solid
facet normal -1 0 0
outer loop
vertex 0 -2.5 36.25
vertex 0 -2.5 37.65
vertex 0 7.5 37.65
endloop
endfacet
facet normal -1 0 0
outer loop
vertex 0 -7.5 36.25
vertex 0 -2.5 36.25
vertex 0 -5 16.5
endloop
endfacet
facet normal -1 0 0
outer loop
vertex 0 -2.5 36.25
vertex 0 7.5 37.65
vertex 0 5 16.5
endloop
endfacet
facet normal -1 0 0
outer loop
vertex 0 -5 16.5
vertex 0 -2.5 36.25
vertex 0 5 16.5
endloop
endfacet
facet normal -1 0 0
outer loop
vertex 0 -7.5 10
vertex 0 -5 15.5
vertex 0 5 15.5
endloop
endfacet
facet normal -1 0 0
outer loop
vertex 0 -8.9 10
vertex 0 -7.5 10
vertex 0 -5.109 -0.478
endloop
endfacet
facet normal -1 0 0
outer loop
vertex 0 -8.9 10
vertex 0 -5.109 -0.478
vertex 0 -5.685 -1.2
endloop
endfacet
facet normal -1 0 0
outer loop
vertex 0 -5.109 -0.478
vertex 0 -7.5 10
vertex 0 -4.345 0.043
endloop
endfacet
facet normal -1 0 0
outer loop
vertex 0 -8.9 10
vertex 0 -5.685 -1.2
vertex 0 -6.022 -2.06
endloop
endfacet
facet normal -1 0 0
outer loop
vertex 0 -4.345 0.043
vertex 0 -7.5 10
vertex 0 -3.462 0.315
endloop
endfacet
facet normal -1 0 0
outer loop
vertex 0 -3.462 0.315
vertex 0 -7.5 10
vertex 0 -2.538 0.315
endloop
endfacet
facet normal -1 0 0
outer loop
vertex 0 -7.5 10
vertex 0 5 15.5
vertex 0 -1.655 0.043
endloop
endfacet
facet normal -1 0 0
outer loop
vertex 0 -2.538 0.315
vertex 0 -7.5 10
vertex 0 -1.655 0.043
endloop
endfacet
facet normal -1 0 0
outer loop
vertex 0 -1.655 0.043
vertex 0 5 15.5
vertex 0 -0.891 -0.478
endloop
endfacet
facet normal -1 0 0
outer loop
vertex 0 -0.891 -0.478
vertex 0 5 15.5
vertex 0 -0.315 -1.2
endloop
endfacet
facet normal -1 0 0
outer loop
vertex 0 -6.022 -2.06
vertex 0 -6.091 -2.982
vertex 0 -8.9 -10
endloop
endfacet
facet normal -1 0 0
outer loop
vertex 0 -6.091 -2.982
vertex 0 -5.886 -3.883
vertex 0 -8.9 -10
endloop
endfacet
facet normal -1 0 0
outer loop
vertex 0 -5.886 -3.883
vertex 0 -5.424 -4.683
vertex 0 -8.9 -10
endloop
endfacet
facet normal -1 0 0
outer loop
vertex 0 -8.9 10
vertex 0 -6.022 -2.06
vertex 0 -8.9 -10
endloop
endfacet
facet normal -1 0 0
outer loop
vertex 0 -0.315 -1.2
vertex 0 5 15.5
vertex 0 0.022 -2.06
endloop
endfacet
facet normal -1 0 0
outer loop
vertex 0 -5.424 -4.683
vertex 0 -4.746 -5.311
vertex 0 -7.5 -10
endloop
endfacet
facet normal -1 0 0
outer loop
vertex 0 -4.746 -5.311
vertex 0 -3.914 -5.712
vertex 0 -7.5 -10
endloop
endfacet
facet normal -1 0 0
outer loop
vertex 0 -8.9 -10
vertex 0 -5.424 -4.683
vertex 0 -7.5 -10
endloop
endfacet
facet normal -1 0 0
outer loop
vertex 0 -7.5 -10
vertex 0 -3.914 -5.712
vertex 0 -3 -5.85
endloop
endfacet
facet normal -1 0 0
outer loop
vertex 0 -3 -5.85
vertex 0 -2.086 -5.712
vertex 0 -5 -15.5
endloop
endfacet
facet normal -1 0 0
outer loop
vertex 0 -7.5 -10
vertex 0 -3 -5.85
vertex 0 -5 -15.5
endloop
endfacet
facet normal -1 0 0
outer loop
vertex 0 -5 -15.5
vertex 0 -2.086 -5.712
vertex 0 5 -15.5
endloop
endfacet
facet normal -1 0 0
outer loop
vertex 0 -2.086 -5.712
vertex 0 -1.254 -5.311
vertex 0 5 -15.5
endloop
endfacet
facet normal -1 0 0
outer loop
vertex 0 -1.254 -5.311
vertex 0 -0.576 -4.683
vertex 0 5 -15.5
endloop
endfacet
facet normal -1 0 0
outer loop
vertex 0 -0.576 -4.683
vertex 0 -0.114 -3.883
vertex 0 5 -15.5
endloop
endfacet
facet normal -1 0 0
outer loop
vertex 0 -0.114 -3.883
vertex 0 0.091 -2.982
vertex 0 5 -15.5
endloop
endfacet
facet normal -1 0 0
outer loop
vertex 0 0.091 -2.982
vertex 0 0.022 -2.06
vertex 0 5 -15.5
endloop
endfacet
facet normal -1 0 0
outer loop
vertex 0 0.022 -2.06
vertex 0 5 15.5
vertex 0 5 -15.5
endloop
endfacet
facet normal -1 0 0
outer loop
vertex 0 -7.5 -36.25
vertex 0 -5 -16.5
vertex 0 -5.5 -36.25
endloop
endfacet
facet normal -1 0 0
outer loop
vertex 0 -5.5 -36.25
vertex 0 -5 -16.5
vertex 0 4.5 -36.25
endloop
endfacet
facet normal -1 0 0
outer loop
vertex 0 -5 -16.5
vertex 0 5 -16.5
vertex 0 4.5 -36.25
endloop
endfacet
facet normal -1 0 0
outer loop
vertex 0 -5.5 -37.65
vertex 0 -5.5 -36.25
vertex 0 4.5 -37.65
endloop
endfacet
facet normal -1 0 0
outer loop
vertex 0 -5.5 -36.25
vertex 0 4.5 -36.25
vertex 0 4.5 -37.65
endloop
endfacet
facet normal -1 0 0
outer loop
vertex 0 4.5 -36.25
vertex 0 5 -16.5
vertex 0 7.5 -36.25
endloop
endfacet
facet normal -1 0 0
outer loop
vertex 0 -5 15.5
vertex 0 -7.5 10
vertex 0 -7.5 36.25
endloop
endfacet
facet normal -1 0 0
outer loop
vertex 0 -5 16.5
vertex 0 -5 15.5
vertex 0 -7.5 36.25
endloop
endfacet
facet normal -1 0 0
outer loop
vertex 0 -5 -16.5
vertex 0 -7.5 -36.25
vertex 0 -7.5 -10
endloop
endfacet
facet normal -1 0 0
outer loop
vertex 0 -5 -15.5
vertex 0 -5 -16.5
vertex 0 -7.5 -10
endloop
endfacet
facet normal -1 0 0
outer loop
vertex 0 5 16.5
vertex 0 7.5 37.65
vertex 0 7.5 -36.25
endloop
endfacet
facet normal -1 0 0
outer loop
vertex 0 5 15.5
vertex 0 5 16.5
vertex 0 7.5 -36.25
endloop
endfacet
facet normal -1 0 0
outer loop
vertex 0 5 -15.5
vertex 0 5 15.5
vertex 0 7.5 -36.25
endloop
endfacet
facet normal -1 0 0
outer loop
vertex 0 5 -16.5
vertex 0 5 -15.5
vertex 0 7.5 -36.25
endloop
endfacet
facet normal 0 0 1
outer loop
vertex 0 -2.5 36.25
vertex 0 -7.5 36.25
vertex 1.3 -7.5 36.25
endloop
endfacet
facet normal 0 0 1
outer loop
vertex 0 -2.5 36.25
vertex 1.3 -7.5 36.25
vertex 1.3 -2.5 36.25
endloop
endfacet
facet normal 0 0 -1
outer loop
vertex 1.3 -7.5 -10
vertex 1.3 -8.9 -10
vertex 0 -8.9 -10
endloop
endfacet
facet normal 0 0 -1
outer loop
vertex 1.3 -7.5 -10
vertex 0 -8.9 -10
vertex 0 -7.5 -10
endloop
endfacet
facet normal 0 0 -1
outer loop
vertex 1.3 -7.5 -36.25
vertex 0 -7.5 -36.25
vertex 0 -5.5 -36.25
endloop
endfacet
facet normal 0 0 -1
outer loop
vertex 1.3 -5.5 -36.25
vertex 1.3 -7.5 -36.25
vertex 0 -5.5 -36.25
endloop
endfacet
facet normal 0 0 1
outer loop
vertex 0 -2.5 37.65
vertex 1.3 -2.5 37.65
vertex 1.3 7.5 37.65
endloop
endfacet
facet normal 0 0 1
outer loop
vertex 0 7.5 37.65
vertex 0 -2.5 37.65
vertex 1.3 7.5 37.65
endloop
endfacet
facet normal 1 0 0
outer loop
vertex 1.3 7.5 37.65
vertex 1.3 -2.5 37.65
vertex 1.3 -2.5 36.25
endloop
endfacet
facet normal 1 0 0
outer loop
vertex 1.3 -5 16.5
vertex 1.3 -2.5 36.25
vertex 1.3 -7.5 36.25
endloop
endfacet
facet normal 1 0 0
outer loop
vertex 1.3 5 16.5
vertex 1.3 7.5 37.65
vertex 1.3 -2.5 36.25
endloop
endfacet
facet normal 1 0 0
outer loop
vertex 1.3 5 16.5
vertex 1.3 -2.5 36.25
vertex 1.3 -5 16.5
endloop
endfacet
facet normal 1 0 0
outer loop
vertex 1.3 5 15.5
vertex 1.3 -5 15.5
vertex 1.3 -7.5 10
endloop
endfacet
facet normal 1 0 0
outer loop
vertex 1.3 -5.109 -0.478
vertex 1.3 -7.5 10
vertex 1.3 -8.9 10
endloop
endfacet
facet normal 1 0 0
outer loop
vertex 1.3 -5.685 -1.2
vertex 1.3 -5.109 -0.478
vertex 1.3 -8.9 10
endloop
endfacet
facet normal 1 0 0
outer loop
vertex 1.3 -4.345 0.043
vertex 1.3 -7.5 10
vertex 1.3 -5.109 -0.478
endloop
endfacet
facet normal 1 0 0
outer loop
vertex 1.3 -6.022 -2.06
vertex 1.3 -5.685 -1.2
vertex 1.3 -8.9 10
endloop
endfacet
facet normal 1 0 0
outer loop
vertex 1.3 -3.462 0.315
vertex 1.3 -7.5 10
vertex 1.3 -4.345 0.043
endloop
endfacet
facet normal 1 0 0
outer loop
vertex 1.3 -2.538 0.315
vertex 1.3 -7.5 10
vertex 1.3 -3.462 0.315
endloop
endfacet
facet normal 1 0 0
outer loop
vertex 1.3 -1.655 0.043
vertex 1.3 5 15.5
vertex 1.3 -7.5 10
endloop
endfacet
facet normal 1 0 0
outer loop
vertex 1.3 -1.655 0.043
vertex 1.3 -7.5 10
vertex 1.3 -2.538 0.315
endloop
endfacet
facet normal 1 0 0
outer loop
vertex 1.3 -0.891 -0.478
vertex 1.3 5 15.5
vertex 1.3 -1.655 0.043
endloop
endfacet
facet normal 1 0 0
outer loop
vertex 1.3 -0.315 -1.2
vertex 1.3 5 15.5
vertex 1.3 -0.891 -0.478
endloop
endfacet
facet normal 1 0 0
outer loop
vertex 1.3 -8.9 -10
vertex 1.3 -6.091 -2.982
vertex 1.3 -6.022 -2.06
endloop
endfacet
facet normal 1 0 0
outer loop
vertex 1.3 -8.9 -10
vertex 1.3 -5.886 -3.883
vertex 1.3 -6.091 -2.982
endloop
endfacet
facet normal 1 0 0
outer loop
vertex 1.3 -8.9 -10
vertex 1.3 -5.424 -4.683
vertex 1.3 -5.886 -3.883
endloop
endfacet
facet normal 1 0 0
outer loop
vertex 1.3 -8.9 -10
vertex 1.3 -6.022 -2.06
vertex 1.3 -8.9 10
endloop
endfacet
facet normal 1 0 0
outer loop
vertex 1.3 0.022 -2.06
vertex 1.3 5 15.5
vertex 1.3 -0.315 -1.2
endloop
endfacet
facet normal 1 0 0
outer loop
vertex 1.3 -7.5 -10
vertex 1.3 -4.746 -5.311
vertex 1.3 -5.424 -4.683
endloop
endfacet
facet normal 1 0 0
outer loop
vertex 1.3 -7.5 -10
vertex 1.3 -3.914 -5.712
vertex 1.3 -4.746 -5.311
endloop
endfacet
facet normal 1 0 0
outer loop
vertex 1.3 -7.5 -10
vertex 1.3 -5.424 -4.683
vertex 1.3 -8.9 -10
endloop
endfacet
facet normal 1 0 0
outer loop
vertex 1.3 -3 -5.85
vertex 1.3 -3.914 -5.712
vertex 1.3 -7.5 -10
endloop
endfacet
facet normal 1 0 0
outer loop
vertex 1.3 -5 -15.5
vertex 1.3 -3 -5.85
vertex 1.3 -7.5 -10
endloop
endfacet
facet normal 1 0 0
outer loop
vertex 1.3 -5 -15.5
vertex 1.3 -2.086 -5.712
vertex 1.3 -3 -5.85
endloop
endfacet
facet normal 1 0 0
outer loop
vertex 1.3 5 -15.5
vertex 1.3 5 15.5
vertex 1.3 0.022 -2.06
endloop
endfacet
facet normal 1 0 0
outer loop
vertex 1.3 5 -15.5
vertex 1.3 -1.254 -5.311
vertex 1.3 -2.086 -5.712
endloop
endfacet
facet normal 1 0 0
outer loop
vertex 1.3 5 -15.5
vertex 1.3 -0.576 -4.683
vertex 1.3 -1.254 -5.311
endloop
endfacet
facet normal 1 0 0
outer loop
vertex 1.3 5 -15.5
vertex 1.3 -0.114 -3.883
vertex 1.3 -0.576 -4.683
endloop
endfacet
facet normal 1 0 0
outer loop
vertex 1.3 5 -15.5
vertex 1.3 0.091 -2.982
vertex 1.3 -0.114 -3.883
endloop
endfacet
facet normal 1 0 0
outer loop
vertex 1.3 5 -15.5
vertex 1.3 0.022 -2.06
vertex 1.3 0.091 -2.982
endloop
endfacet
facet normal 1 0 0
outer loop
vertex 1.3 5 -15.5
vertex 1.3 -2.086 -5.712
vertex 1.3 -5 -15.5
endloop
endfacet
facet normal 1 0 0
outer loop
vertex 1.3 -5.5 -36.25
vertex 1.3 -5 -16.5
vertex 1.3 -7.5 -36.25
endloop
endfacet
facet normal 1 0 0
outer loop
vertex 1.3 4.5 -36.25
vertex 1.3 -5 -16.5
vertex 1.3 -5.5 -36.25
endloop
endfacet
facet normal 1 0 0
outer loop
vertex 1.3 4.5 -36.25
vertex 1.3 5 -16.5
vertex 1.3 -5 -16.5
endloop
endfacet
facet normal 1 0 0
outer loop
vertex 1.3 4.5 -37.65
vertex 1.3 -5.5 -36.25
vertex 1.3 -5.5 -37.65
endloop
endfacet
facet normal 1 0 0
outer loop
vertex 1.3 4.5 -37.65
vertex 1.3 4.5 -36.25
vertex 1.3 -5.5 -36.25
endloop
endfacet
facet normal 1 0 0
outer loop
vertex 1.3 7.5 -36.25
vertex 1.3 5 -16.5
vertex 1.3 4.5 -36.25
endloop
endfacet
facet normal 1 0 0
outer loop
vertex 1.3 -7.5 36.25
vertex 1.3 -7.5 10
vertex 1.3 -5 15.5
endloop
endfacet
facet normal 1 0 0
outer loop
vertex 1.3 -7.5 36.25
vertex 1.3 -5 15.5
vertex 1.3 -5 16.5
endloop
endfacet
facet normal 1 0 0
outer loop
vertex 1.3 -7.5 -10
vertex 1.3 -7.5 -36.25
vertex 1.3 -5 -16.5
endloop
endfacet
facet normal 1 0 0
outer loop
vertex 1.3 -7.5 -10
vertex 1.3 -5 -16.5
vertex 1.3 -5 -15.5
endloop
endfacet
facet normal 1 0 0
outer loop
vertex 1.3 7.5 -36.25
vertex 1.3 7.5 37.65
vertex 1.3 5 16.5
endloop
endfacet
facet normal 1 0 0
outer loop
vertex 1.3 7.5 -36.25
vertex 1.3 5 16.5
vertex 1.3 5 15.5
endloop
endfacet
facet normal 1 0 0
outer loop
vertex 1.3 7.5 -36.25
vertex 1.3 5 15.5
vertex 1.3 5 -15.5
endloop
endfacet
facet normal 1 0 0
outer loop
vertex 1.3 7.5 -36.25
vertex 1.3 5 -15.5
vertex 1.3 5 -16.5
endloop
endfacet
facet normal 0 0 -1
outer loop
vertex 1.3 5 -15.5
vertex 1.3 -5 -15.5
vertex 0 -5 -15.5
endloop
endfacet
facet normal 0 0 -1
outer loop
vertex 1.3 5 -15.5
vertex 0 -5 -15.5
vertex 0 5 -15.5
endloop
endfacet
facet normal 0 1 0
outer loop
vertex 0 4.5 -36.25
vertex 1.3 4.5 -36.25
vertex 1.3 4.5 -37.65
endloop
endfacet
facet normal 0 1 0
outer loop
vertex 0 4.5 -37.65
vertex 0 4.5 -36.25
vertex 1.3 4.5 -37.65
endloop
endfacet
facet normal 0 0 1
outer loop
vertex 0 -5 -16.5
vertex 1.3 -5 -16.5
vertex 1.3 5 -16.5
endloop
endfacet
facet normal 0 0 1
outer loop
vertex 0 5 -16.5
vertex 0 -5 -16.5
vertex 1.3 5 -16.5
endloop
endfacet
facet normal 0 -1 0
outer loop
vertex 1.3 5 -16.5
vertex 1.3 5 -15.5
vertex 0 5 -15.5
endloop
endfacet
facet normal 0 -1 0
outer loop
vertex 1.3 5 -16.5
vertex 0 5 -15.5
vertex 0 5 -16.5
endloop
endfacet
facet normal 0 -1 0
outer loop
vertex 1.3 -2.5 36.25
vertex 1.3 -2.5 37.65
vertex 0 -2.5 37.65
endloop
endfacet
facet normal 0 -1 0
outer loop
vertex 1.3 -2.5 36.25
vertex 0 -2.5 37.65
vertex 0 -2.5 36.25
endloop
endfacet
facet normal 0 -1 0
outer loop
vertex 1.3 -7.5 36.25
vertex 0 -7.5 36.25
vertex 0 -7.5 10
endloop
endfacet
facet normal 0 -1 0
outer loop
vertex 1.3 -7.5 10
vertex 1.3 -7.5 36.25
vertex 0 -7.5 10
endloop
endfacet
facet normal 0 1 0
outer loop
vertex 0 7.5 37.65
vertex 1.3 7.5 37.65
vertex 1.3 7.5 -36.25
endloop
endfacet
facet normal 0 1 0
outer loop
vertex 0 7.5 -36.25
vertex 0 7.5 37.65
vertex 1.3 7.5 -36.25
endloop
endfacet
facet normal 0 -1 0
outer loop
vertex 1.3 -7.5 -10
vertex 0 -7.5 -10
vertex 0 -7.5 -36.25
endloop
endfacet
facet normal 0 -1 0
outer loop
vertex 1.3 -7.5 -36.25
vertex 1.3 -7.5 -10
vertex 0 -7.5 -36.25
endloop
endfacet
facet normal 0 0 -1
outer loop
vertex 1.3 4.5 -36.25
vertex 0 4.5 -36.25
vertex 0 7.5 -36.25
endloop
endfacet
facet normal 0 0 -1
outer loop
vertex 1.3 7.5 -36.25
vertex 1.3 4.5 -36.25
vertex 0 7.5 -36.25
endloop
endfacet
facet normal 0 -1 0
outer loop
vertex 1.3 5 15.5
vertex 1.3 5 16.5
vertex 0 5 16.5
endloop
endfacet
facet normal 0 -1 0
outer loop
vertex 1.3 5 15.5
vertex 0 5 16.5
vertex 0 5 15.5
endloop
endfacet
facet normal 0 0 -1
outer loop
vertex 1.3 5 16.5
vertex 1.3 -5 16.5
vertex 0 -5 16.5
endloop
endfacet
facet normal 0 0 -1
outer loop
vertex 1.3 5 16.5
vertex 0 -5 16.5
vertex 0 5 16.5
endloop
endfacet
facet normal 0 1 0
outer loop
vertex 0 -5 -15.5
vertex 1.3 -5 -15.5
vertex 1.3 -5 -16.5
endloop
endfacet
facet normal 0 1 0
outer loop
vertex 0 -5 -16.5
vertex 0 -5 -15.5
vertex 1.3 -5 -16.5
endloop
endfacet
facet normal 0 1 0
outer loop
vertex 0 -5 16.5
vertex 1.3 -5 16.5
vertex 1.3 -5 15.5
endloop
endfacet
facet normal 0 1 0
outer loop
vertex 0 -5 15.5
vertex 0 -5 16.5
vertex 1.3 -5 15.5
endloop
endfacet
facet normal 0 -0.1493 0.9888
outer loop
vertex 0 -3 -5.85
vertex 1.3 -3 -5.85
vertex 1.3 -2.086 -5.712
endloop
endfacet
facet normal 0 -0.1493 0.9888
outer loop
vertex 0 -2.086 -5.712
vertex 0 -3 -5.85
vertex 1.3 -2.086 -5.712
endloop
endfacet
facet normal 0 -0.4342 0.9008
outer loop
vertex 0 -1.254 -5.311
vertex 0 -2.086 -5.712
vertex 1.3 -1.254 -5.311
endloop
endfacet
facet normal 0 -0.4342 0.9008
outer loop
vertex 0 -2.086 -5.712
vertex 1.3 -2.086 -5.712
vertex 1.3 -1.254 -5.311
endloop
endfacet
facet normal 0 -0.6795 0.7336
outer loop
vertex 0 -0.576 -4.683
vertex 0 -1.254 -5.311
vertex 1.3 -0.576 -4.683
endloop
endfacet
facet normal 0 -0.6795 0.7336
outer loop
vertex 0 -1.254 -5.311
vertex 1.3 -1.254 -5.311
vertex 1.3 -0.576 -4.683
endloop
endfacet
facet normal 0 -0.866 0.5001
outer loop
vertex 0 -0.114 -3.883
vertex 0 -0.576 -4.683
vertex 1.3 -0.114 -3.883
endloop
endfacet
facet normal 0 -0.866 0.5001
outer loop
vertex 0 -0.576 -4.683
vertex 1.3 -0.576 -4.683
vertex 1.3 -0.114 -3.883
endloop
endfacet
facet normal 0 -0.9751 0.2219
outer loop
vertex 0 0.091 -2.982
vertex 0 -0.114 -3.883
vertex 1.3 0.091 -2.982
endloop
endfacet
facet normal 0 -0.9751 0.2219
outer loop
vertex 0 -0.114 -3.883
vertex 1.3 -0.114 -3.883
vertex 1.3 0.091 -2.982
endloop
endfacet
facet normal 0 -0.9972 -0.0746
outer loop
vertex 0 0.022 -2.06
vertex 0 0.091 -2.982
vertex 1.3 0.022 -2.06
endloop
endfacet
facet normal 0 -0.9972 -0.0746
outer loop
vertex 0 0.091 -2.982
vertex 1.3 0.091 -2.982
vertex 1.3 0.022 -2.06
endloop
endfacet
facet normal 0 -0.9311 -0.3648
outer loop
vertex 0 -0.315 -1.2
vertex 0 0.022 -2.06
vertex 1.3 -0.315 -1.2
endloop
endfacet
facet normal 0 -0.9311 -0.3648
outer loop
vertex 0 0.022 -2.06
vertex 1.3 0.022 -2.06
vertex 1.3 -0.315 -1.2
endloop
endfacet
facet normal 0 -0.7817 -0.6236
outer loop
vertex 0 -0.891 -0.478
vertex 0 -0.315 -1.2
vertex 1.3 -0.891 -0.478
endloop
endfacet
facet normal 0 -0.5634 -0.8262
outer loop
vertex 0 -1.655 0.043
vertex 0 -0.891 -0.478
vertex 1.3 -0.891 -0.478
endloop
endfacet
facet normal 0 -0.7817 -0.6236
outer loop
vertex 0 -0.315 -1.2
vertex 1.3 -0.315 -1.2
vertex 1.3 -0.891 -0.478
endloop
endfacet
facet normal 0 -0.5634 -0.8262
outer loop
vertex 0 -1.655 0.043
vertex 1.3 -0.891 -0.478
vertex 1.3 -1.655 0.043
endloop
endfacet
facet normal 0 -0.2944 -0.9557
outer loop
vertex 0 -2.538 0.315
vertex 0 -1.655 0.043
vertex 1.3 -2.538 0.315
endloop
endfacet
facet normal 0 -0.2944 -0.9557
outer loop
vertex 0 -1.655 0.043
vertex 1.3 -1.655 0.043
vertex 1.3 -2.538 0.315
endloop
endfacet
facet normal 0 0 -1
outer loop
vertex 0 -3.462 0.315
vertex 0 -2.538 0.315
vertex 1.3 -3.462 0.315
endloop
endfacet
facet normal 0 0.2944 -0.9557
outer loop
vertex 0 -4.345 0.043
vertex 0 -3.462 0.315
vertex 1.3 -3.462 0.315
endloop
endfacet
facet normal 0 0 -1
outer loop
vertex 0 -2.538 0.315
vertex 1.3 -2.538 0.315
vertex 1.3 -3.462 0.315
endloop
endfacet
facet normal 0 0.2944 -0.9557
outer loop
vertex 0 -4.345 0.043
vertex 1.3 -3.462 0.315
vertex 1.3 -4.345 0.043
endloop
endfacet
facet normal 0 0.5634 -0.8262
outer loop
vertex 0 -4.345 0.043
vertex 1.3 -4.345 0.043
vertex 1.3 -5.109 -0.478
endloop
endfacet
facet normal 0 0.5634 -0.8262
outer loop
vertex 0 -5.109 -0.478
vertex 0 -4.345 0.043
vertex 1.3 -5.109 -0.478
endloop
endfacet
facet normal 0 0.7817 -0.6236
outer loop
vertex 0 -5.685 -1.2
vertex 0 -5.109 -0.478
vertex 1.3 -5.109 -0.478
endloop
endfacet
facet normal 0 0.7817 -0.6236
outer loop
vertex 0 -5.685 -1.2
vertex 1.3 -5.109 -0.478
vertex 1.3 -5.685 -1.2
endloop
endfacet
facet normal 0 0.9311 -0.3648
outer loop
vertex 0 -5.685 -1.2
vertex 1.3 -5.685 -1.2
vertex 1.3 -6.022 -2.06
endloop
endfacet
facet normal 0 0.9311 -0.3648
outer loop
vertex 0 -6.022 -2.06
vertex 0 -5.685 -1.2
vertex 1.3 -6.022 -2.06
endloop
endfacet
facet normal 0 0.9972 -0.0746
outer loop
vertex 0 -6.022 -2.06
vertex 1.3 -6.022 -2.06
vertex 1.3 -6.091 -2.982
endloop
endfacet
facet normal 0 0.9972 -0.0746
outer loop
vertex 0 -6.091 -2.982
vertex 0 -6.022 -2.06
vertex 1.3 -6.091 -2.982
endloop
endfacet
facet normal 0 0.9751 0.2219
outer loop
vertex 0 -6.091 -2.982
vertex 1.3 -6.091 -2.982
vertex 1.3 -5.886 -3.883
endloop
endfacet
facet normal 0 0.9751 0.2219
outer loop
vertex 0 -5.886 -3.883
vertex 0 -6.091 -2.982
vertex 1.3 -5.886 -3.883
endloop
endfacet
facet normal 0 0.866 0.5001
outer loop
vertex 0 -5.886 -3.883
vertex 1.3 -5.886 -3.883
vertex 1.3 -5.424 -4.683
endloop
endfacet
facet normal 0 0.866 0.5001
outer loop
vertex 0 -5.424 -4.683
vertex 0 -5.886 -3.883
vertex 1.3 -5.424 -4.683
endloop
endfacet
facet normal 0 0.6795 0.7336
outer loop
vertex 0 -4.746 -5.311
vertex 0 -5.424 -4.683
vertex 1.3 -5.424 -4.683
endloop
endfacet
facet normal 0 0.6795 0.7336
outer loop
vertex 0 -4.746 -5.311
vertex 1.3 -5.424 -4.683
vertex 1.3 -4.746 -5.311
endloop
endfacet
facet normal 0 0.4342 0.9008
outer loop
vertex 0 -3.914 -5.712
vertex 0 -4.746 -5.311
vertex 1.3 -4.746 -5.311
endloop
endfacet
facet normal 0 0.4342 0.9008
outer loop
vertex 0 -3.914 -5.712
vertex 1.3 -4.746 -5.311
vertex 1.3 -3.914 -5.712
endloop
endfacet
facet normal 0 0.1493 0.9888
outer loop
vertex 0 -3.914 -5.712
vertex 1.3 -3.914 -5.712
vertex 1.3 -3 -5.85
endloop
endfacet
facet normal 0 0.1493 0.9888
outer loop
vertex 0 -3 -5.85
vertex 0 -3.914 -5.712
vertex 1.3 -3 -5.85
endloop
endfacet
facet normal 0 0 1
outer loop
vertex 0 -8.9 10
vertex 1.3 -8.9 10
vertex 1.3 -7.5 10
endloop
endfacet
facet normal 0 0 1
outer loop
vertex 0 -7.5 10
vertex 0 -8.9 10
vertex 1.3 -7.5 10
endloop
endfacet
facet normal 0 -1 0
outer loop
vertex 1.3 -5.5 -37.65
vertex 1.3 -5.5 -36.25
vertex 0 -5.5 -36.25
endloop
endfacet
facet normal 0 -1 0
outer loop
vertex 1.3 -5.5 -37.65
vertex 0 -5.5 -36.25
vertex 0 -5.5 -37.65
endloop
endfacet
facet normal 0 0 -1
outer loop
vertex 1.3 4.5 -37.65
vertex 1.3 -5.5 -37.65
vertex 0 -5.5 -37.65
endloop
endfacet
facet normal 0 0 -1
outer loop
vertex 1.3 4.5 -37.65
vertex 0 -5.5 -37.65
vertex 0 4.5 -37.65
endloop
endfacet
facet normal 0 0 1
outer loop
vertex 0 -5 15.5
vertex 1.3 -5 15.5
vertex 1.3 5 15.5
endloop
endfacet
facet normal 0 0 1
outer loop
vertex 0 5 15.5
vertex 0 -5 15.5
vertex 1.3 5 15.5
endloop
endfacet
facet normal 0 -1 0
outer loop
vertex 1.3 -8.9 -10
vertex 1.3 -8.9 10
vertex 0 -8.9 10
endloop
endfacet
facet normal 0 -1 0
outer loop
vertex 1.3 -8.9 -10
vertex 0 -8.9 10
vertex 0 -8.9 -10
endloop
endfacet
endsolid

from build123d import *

# Parameters (mm, degrees)
SKETCH1_W           = 72.5
SKETCH1_H           = 15
BOSS_EXTRUDE1_DEPTH = 1.3
SKETCH2_W           = 1.4
SKETCH2_H           = 10
SKETCH2_W_2         = 20
SKETCH2_H_2         = 1.4
BOSS_EXTRUDE2_DEPTH = 1.3
SKETCH3_W           = 1
SKETCH3_H           = 10
CUT_EXTRUDE1_DEPTH  = 39.709462667
SKETCH4_R           = 3.1
CUT_EXTRUDE2_DEPTH  = 39.709462667


with BuildPart() as part:
    # Sketch1 → Boss-Extrude1 (new body)
    with BuildSketch(Plane(origin=(0, 0, 0), x_dir=(0, 0, -1), z_dir=(1, 0, 0))):
        Rectangle(SKETCH1_W, SKETCH1_H)
    extrude(amount=BOSS_EXTRUDE1_DEPTH)

    # Sketch2 → Boss-Extrude2 (add)
    with BuildSketch(Plane(origin=(1.3, 0, 0), x_dir=(0, 0, -1), z_dir=(1, 0, 0))):
        with Locations((-36.95, 2.5)):
            Rectangle(SKETCH2_W, SKETCH2_H)
        with Locations((36.95, -0.5)):
            Rectangle(SKETCH2_W, SKETCH2_H)
        with Locations((0, -8.2)):
            Rectangle(SKETCH2_W_2, SKETCH2_H_2)
    extrude(amount=-BOSS_EXTRUDE2_DEPTH)

    # Sketch3 → Cut-Extrude1 (cut, through all)
    with BuildSketch(Plane(origin=(1.3, 0, 0), x_dir=(0, 0, -1), z_dir=(1, 0, 0))):
        with Locations((16, 0)):
            Rectangle(SKETCH3_W, SKETCH3_H)
        with Locations((-16, 0)):
            Rectangle(SKETCH3_W, SKETCH3_H)
    extrude(amount=-CUT_EXTRUDE1_DEPTH, mode=Mode.SUBTRACT)

    # Sketch4 → Cut-Extrude2 (cut, through all)
    with BuildSketch(Plane(origin=(1.3, 0, 0), x_dir=(0, 0, -1), z_dir=(1, 0, 0))):
        with Locations((2.75, -3)):
            Circle(SKETCH4_R)
    extrude(amount=-CUT_EXTRUDE2_DEPTH, mode=Mode.SUBTRACT)


solid = part.part
